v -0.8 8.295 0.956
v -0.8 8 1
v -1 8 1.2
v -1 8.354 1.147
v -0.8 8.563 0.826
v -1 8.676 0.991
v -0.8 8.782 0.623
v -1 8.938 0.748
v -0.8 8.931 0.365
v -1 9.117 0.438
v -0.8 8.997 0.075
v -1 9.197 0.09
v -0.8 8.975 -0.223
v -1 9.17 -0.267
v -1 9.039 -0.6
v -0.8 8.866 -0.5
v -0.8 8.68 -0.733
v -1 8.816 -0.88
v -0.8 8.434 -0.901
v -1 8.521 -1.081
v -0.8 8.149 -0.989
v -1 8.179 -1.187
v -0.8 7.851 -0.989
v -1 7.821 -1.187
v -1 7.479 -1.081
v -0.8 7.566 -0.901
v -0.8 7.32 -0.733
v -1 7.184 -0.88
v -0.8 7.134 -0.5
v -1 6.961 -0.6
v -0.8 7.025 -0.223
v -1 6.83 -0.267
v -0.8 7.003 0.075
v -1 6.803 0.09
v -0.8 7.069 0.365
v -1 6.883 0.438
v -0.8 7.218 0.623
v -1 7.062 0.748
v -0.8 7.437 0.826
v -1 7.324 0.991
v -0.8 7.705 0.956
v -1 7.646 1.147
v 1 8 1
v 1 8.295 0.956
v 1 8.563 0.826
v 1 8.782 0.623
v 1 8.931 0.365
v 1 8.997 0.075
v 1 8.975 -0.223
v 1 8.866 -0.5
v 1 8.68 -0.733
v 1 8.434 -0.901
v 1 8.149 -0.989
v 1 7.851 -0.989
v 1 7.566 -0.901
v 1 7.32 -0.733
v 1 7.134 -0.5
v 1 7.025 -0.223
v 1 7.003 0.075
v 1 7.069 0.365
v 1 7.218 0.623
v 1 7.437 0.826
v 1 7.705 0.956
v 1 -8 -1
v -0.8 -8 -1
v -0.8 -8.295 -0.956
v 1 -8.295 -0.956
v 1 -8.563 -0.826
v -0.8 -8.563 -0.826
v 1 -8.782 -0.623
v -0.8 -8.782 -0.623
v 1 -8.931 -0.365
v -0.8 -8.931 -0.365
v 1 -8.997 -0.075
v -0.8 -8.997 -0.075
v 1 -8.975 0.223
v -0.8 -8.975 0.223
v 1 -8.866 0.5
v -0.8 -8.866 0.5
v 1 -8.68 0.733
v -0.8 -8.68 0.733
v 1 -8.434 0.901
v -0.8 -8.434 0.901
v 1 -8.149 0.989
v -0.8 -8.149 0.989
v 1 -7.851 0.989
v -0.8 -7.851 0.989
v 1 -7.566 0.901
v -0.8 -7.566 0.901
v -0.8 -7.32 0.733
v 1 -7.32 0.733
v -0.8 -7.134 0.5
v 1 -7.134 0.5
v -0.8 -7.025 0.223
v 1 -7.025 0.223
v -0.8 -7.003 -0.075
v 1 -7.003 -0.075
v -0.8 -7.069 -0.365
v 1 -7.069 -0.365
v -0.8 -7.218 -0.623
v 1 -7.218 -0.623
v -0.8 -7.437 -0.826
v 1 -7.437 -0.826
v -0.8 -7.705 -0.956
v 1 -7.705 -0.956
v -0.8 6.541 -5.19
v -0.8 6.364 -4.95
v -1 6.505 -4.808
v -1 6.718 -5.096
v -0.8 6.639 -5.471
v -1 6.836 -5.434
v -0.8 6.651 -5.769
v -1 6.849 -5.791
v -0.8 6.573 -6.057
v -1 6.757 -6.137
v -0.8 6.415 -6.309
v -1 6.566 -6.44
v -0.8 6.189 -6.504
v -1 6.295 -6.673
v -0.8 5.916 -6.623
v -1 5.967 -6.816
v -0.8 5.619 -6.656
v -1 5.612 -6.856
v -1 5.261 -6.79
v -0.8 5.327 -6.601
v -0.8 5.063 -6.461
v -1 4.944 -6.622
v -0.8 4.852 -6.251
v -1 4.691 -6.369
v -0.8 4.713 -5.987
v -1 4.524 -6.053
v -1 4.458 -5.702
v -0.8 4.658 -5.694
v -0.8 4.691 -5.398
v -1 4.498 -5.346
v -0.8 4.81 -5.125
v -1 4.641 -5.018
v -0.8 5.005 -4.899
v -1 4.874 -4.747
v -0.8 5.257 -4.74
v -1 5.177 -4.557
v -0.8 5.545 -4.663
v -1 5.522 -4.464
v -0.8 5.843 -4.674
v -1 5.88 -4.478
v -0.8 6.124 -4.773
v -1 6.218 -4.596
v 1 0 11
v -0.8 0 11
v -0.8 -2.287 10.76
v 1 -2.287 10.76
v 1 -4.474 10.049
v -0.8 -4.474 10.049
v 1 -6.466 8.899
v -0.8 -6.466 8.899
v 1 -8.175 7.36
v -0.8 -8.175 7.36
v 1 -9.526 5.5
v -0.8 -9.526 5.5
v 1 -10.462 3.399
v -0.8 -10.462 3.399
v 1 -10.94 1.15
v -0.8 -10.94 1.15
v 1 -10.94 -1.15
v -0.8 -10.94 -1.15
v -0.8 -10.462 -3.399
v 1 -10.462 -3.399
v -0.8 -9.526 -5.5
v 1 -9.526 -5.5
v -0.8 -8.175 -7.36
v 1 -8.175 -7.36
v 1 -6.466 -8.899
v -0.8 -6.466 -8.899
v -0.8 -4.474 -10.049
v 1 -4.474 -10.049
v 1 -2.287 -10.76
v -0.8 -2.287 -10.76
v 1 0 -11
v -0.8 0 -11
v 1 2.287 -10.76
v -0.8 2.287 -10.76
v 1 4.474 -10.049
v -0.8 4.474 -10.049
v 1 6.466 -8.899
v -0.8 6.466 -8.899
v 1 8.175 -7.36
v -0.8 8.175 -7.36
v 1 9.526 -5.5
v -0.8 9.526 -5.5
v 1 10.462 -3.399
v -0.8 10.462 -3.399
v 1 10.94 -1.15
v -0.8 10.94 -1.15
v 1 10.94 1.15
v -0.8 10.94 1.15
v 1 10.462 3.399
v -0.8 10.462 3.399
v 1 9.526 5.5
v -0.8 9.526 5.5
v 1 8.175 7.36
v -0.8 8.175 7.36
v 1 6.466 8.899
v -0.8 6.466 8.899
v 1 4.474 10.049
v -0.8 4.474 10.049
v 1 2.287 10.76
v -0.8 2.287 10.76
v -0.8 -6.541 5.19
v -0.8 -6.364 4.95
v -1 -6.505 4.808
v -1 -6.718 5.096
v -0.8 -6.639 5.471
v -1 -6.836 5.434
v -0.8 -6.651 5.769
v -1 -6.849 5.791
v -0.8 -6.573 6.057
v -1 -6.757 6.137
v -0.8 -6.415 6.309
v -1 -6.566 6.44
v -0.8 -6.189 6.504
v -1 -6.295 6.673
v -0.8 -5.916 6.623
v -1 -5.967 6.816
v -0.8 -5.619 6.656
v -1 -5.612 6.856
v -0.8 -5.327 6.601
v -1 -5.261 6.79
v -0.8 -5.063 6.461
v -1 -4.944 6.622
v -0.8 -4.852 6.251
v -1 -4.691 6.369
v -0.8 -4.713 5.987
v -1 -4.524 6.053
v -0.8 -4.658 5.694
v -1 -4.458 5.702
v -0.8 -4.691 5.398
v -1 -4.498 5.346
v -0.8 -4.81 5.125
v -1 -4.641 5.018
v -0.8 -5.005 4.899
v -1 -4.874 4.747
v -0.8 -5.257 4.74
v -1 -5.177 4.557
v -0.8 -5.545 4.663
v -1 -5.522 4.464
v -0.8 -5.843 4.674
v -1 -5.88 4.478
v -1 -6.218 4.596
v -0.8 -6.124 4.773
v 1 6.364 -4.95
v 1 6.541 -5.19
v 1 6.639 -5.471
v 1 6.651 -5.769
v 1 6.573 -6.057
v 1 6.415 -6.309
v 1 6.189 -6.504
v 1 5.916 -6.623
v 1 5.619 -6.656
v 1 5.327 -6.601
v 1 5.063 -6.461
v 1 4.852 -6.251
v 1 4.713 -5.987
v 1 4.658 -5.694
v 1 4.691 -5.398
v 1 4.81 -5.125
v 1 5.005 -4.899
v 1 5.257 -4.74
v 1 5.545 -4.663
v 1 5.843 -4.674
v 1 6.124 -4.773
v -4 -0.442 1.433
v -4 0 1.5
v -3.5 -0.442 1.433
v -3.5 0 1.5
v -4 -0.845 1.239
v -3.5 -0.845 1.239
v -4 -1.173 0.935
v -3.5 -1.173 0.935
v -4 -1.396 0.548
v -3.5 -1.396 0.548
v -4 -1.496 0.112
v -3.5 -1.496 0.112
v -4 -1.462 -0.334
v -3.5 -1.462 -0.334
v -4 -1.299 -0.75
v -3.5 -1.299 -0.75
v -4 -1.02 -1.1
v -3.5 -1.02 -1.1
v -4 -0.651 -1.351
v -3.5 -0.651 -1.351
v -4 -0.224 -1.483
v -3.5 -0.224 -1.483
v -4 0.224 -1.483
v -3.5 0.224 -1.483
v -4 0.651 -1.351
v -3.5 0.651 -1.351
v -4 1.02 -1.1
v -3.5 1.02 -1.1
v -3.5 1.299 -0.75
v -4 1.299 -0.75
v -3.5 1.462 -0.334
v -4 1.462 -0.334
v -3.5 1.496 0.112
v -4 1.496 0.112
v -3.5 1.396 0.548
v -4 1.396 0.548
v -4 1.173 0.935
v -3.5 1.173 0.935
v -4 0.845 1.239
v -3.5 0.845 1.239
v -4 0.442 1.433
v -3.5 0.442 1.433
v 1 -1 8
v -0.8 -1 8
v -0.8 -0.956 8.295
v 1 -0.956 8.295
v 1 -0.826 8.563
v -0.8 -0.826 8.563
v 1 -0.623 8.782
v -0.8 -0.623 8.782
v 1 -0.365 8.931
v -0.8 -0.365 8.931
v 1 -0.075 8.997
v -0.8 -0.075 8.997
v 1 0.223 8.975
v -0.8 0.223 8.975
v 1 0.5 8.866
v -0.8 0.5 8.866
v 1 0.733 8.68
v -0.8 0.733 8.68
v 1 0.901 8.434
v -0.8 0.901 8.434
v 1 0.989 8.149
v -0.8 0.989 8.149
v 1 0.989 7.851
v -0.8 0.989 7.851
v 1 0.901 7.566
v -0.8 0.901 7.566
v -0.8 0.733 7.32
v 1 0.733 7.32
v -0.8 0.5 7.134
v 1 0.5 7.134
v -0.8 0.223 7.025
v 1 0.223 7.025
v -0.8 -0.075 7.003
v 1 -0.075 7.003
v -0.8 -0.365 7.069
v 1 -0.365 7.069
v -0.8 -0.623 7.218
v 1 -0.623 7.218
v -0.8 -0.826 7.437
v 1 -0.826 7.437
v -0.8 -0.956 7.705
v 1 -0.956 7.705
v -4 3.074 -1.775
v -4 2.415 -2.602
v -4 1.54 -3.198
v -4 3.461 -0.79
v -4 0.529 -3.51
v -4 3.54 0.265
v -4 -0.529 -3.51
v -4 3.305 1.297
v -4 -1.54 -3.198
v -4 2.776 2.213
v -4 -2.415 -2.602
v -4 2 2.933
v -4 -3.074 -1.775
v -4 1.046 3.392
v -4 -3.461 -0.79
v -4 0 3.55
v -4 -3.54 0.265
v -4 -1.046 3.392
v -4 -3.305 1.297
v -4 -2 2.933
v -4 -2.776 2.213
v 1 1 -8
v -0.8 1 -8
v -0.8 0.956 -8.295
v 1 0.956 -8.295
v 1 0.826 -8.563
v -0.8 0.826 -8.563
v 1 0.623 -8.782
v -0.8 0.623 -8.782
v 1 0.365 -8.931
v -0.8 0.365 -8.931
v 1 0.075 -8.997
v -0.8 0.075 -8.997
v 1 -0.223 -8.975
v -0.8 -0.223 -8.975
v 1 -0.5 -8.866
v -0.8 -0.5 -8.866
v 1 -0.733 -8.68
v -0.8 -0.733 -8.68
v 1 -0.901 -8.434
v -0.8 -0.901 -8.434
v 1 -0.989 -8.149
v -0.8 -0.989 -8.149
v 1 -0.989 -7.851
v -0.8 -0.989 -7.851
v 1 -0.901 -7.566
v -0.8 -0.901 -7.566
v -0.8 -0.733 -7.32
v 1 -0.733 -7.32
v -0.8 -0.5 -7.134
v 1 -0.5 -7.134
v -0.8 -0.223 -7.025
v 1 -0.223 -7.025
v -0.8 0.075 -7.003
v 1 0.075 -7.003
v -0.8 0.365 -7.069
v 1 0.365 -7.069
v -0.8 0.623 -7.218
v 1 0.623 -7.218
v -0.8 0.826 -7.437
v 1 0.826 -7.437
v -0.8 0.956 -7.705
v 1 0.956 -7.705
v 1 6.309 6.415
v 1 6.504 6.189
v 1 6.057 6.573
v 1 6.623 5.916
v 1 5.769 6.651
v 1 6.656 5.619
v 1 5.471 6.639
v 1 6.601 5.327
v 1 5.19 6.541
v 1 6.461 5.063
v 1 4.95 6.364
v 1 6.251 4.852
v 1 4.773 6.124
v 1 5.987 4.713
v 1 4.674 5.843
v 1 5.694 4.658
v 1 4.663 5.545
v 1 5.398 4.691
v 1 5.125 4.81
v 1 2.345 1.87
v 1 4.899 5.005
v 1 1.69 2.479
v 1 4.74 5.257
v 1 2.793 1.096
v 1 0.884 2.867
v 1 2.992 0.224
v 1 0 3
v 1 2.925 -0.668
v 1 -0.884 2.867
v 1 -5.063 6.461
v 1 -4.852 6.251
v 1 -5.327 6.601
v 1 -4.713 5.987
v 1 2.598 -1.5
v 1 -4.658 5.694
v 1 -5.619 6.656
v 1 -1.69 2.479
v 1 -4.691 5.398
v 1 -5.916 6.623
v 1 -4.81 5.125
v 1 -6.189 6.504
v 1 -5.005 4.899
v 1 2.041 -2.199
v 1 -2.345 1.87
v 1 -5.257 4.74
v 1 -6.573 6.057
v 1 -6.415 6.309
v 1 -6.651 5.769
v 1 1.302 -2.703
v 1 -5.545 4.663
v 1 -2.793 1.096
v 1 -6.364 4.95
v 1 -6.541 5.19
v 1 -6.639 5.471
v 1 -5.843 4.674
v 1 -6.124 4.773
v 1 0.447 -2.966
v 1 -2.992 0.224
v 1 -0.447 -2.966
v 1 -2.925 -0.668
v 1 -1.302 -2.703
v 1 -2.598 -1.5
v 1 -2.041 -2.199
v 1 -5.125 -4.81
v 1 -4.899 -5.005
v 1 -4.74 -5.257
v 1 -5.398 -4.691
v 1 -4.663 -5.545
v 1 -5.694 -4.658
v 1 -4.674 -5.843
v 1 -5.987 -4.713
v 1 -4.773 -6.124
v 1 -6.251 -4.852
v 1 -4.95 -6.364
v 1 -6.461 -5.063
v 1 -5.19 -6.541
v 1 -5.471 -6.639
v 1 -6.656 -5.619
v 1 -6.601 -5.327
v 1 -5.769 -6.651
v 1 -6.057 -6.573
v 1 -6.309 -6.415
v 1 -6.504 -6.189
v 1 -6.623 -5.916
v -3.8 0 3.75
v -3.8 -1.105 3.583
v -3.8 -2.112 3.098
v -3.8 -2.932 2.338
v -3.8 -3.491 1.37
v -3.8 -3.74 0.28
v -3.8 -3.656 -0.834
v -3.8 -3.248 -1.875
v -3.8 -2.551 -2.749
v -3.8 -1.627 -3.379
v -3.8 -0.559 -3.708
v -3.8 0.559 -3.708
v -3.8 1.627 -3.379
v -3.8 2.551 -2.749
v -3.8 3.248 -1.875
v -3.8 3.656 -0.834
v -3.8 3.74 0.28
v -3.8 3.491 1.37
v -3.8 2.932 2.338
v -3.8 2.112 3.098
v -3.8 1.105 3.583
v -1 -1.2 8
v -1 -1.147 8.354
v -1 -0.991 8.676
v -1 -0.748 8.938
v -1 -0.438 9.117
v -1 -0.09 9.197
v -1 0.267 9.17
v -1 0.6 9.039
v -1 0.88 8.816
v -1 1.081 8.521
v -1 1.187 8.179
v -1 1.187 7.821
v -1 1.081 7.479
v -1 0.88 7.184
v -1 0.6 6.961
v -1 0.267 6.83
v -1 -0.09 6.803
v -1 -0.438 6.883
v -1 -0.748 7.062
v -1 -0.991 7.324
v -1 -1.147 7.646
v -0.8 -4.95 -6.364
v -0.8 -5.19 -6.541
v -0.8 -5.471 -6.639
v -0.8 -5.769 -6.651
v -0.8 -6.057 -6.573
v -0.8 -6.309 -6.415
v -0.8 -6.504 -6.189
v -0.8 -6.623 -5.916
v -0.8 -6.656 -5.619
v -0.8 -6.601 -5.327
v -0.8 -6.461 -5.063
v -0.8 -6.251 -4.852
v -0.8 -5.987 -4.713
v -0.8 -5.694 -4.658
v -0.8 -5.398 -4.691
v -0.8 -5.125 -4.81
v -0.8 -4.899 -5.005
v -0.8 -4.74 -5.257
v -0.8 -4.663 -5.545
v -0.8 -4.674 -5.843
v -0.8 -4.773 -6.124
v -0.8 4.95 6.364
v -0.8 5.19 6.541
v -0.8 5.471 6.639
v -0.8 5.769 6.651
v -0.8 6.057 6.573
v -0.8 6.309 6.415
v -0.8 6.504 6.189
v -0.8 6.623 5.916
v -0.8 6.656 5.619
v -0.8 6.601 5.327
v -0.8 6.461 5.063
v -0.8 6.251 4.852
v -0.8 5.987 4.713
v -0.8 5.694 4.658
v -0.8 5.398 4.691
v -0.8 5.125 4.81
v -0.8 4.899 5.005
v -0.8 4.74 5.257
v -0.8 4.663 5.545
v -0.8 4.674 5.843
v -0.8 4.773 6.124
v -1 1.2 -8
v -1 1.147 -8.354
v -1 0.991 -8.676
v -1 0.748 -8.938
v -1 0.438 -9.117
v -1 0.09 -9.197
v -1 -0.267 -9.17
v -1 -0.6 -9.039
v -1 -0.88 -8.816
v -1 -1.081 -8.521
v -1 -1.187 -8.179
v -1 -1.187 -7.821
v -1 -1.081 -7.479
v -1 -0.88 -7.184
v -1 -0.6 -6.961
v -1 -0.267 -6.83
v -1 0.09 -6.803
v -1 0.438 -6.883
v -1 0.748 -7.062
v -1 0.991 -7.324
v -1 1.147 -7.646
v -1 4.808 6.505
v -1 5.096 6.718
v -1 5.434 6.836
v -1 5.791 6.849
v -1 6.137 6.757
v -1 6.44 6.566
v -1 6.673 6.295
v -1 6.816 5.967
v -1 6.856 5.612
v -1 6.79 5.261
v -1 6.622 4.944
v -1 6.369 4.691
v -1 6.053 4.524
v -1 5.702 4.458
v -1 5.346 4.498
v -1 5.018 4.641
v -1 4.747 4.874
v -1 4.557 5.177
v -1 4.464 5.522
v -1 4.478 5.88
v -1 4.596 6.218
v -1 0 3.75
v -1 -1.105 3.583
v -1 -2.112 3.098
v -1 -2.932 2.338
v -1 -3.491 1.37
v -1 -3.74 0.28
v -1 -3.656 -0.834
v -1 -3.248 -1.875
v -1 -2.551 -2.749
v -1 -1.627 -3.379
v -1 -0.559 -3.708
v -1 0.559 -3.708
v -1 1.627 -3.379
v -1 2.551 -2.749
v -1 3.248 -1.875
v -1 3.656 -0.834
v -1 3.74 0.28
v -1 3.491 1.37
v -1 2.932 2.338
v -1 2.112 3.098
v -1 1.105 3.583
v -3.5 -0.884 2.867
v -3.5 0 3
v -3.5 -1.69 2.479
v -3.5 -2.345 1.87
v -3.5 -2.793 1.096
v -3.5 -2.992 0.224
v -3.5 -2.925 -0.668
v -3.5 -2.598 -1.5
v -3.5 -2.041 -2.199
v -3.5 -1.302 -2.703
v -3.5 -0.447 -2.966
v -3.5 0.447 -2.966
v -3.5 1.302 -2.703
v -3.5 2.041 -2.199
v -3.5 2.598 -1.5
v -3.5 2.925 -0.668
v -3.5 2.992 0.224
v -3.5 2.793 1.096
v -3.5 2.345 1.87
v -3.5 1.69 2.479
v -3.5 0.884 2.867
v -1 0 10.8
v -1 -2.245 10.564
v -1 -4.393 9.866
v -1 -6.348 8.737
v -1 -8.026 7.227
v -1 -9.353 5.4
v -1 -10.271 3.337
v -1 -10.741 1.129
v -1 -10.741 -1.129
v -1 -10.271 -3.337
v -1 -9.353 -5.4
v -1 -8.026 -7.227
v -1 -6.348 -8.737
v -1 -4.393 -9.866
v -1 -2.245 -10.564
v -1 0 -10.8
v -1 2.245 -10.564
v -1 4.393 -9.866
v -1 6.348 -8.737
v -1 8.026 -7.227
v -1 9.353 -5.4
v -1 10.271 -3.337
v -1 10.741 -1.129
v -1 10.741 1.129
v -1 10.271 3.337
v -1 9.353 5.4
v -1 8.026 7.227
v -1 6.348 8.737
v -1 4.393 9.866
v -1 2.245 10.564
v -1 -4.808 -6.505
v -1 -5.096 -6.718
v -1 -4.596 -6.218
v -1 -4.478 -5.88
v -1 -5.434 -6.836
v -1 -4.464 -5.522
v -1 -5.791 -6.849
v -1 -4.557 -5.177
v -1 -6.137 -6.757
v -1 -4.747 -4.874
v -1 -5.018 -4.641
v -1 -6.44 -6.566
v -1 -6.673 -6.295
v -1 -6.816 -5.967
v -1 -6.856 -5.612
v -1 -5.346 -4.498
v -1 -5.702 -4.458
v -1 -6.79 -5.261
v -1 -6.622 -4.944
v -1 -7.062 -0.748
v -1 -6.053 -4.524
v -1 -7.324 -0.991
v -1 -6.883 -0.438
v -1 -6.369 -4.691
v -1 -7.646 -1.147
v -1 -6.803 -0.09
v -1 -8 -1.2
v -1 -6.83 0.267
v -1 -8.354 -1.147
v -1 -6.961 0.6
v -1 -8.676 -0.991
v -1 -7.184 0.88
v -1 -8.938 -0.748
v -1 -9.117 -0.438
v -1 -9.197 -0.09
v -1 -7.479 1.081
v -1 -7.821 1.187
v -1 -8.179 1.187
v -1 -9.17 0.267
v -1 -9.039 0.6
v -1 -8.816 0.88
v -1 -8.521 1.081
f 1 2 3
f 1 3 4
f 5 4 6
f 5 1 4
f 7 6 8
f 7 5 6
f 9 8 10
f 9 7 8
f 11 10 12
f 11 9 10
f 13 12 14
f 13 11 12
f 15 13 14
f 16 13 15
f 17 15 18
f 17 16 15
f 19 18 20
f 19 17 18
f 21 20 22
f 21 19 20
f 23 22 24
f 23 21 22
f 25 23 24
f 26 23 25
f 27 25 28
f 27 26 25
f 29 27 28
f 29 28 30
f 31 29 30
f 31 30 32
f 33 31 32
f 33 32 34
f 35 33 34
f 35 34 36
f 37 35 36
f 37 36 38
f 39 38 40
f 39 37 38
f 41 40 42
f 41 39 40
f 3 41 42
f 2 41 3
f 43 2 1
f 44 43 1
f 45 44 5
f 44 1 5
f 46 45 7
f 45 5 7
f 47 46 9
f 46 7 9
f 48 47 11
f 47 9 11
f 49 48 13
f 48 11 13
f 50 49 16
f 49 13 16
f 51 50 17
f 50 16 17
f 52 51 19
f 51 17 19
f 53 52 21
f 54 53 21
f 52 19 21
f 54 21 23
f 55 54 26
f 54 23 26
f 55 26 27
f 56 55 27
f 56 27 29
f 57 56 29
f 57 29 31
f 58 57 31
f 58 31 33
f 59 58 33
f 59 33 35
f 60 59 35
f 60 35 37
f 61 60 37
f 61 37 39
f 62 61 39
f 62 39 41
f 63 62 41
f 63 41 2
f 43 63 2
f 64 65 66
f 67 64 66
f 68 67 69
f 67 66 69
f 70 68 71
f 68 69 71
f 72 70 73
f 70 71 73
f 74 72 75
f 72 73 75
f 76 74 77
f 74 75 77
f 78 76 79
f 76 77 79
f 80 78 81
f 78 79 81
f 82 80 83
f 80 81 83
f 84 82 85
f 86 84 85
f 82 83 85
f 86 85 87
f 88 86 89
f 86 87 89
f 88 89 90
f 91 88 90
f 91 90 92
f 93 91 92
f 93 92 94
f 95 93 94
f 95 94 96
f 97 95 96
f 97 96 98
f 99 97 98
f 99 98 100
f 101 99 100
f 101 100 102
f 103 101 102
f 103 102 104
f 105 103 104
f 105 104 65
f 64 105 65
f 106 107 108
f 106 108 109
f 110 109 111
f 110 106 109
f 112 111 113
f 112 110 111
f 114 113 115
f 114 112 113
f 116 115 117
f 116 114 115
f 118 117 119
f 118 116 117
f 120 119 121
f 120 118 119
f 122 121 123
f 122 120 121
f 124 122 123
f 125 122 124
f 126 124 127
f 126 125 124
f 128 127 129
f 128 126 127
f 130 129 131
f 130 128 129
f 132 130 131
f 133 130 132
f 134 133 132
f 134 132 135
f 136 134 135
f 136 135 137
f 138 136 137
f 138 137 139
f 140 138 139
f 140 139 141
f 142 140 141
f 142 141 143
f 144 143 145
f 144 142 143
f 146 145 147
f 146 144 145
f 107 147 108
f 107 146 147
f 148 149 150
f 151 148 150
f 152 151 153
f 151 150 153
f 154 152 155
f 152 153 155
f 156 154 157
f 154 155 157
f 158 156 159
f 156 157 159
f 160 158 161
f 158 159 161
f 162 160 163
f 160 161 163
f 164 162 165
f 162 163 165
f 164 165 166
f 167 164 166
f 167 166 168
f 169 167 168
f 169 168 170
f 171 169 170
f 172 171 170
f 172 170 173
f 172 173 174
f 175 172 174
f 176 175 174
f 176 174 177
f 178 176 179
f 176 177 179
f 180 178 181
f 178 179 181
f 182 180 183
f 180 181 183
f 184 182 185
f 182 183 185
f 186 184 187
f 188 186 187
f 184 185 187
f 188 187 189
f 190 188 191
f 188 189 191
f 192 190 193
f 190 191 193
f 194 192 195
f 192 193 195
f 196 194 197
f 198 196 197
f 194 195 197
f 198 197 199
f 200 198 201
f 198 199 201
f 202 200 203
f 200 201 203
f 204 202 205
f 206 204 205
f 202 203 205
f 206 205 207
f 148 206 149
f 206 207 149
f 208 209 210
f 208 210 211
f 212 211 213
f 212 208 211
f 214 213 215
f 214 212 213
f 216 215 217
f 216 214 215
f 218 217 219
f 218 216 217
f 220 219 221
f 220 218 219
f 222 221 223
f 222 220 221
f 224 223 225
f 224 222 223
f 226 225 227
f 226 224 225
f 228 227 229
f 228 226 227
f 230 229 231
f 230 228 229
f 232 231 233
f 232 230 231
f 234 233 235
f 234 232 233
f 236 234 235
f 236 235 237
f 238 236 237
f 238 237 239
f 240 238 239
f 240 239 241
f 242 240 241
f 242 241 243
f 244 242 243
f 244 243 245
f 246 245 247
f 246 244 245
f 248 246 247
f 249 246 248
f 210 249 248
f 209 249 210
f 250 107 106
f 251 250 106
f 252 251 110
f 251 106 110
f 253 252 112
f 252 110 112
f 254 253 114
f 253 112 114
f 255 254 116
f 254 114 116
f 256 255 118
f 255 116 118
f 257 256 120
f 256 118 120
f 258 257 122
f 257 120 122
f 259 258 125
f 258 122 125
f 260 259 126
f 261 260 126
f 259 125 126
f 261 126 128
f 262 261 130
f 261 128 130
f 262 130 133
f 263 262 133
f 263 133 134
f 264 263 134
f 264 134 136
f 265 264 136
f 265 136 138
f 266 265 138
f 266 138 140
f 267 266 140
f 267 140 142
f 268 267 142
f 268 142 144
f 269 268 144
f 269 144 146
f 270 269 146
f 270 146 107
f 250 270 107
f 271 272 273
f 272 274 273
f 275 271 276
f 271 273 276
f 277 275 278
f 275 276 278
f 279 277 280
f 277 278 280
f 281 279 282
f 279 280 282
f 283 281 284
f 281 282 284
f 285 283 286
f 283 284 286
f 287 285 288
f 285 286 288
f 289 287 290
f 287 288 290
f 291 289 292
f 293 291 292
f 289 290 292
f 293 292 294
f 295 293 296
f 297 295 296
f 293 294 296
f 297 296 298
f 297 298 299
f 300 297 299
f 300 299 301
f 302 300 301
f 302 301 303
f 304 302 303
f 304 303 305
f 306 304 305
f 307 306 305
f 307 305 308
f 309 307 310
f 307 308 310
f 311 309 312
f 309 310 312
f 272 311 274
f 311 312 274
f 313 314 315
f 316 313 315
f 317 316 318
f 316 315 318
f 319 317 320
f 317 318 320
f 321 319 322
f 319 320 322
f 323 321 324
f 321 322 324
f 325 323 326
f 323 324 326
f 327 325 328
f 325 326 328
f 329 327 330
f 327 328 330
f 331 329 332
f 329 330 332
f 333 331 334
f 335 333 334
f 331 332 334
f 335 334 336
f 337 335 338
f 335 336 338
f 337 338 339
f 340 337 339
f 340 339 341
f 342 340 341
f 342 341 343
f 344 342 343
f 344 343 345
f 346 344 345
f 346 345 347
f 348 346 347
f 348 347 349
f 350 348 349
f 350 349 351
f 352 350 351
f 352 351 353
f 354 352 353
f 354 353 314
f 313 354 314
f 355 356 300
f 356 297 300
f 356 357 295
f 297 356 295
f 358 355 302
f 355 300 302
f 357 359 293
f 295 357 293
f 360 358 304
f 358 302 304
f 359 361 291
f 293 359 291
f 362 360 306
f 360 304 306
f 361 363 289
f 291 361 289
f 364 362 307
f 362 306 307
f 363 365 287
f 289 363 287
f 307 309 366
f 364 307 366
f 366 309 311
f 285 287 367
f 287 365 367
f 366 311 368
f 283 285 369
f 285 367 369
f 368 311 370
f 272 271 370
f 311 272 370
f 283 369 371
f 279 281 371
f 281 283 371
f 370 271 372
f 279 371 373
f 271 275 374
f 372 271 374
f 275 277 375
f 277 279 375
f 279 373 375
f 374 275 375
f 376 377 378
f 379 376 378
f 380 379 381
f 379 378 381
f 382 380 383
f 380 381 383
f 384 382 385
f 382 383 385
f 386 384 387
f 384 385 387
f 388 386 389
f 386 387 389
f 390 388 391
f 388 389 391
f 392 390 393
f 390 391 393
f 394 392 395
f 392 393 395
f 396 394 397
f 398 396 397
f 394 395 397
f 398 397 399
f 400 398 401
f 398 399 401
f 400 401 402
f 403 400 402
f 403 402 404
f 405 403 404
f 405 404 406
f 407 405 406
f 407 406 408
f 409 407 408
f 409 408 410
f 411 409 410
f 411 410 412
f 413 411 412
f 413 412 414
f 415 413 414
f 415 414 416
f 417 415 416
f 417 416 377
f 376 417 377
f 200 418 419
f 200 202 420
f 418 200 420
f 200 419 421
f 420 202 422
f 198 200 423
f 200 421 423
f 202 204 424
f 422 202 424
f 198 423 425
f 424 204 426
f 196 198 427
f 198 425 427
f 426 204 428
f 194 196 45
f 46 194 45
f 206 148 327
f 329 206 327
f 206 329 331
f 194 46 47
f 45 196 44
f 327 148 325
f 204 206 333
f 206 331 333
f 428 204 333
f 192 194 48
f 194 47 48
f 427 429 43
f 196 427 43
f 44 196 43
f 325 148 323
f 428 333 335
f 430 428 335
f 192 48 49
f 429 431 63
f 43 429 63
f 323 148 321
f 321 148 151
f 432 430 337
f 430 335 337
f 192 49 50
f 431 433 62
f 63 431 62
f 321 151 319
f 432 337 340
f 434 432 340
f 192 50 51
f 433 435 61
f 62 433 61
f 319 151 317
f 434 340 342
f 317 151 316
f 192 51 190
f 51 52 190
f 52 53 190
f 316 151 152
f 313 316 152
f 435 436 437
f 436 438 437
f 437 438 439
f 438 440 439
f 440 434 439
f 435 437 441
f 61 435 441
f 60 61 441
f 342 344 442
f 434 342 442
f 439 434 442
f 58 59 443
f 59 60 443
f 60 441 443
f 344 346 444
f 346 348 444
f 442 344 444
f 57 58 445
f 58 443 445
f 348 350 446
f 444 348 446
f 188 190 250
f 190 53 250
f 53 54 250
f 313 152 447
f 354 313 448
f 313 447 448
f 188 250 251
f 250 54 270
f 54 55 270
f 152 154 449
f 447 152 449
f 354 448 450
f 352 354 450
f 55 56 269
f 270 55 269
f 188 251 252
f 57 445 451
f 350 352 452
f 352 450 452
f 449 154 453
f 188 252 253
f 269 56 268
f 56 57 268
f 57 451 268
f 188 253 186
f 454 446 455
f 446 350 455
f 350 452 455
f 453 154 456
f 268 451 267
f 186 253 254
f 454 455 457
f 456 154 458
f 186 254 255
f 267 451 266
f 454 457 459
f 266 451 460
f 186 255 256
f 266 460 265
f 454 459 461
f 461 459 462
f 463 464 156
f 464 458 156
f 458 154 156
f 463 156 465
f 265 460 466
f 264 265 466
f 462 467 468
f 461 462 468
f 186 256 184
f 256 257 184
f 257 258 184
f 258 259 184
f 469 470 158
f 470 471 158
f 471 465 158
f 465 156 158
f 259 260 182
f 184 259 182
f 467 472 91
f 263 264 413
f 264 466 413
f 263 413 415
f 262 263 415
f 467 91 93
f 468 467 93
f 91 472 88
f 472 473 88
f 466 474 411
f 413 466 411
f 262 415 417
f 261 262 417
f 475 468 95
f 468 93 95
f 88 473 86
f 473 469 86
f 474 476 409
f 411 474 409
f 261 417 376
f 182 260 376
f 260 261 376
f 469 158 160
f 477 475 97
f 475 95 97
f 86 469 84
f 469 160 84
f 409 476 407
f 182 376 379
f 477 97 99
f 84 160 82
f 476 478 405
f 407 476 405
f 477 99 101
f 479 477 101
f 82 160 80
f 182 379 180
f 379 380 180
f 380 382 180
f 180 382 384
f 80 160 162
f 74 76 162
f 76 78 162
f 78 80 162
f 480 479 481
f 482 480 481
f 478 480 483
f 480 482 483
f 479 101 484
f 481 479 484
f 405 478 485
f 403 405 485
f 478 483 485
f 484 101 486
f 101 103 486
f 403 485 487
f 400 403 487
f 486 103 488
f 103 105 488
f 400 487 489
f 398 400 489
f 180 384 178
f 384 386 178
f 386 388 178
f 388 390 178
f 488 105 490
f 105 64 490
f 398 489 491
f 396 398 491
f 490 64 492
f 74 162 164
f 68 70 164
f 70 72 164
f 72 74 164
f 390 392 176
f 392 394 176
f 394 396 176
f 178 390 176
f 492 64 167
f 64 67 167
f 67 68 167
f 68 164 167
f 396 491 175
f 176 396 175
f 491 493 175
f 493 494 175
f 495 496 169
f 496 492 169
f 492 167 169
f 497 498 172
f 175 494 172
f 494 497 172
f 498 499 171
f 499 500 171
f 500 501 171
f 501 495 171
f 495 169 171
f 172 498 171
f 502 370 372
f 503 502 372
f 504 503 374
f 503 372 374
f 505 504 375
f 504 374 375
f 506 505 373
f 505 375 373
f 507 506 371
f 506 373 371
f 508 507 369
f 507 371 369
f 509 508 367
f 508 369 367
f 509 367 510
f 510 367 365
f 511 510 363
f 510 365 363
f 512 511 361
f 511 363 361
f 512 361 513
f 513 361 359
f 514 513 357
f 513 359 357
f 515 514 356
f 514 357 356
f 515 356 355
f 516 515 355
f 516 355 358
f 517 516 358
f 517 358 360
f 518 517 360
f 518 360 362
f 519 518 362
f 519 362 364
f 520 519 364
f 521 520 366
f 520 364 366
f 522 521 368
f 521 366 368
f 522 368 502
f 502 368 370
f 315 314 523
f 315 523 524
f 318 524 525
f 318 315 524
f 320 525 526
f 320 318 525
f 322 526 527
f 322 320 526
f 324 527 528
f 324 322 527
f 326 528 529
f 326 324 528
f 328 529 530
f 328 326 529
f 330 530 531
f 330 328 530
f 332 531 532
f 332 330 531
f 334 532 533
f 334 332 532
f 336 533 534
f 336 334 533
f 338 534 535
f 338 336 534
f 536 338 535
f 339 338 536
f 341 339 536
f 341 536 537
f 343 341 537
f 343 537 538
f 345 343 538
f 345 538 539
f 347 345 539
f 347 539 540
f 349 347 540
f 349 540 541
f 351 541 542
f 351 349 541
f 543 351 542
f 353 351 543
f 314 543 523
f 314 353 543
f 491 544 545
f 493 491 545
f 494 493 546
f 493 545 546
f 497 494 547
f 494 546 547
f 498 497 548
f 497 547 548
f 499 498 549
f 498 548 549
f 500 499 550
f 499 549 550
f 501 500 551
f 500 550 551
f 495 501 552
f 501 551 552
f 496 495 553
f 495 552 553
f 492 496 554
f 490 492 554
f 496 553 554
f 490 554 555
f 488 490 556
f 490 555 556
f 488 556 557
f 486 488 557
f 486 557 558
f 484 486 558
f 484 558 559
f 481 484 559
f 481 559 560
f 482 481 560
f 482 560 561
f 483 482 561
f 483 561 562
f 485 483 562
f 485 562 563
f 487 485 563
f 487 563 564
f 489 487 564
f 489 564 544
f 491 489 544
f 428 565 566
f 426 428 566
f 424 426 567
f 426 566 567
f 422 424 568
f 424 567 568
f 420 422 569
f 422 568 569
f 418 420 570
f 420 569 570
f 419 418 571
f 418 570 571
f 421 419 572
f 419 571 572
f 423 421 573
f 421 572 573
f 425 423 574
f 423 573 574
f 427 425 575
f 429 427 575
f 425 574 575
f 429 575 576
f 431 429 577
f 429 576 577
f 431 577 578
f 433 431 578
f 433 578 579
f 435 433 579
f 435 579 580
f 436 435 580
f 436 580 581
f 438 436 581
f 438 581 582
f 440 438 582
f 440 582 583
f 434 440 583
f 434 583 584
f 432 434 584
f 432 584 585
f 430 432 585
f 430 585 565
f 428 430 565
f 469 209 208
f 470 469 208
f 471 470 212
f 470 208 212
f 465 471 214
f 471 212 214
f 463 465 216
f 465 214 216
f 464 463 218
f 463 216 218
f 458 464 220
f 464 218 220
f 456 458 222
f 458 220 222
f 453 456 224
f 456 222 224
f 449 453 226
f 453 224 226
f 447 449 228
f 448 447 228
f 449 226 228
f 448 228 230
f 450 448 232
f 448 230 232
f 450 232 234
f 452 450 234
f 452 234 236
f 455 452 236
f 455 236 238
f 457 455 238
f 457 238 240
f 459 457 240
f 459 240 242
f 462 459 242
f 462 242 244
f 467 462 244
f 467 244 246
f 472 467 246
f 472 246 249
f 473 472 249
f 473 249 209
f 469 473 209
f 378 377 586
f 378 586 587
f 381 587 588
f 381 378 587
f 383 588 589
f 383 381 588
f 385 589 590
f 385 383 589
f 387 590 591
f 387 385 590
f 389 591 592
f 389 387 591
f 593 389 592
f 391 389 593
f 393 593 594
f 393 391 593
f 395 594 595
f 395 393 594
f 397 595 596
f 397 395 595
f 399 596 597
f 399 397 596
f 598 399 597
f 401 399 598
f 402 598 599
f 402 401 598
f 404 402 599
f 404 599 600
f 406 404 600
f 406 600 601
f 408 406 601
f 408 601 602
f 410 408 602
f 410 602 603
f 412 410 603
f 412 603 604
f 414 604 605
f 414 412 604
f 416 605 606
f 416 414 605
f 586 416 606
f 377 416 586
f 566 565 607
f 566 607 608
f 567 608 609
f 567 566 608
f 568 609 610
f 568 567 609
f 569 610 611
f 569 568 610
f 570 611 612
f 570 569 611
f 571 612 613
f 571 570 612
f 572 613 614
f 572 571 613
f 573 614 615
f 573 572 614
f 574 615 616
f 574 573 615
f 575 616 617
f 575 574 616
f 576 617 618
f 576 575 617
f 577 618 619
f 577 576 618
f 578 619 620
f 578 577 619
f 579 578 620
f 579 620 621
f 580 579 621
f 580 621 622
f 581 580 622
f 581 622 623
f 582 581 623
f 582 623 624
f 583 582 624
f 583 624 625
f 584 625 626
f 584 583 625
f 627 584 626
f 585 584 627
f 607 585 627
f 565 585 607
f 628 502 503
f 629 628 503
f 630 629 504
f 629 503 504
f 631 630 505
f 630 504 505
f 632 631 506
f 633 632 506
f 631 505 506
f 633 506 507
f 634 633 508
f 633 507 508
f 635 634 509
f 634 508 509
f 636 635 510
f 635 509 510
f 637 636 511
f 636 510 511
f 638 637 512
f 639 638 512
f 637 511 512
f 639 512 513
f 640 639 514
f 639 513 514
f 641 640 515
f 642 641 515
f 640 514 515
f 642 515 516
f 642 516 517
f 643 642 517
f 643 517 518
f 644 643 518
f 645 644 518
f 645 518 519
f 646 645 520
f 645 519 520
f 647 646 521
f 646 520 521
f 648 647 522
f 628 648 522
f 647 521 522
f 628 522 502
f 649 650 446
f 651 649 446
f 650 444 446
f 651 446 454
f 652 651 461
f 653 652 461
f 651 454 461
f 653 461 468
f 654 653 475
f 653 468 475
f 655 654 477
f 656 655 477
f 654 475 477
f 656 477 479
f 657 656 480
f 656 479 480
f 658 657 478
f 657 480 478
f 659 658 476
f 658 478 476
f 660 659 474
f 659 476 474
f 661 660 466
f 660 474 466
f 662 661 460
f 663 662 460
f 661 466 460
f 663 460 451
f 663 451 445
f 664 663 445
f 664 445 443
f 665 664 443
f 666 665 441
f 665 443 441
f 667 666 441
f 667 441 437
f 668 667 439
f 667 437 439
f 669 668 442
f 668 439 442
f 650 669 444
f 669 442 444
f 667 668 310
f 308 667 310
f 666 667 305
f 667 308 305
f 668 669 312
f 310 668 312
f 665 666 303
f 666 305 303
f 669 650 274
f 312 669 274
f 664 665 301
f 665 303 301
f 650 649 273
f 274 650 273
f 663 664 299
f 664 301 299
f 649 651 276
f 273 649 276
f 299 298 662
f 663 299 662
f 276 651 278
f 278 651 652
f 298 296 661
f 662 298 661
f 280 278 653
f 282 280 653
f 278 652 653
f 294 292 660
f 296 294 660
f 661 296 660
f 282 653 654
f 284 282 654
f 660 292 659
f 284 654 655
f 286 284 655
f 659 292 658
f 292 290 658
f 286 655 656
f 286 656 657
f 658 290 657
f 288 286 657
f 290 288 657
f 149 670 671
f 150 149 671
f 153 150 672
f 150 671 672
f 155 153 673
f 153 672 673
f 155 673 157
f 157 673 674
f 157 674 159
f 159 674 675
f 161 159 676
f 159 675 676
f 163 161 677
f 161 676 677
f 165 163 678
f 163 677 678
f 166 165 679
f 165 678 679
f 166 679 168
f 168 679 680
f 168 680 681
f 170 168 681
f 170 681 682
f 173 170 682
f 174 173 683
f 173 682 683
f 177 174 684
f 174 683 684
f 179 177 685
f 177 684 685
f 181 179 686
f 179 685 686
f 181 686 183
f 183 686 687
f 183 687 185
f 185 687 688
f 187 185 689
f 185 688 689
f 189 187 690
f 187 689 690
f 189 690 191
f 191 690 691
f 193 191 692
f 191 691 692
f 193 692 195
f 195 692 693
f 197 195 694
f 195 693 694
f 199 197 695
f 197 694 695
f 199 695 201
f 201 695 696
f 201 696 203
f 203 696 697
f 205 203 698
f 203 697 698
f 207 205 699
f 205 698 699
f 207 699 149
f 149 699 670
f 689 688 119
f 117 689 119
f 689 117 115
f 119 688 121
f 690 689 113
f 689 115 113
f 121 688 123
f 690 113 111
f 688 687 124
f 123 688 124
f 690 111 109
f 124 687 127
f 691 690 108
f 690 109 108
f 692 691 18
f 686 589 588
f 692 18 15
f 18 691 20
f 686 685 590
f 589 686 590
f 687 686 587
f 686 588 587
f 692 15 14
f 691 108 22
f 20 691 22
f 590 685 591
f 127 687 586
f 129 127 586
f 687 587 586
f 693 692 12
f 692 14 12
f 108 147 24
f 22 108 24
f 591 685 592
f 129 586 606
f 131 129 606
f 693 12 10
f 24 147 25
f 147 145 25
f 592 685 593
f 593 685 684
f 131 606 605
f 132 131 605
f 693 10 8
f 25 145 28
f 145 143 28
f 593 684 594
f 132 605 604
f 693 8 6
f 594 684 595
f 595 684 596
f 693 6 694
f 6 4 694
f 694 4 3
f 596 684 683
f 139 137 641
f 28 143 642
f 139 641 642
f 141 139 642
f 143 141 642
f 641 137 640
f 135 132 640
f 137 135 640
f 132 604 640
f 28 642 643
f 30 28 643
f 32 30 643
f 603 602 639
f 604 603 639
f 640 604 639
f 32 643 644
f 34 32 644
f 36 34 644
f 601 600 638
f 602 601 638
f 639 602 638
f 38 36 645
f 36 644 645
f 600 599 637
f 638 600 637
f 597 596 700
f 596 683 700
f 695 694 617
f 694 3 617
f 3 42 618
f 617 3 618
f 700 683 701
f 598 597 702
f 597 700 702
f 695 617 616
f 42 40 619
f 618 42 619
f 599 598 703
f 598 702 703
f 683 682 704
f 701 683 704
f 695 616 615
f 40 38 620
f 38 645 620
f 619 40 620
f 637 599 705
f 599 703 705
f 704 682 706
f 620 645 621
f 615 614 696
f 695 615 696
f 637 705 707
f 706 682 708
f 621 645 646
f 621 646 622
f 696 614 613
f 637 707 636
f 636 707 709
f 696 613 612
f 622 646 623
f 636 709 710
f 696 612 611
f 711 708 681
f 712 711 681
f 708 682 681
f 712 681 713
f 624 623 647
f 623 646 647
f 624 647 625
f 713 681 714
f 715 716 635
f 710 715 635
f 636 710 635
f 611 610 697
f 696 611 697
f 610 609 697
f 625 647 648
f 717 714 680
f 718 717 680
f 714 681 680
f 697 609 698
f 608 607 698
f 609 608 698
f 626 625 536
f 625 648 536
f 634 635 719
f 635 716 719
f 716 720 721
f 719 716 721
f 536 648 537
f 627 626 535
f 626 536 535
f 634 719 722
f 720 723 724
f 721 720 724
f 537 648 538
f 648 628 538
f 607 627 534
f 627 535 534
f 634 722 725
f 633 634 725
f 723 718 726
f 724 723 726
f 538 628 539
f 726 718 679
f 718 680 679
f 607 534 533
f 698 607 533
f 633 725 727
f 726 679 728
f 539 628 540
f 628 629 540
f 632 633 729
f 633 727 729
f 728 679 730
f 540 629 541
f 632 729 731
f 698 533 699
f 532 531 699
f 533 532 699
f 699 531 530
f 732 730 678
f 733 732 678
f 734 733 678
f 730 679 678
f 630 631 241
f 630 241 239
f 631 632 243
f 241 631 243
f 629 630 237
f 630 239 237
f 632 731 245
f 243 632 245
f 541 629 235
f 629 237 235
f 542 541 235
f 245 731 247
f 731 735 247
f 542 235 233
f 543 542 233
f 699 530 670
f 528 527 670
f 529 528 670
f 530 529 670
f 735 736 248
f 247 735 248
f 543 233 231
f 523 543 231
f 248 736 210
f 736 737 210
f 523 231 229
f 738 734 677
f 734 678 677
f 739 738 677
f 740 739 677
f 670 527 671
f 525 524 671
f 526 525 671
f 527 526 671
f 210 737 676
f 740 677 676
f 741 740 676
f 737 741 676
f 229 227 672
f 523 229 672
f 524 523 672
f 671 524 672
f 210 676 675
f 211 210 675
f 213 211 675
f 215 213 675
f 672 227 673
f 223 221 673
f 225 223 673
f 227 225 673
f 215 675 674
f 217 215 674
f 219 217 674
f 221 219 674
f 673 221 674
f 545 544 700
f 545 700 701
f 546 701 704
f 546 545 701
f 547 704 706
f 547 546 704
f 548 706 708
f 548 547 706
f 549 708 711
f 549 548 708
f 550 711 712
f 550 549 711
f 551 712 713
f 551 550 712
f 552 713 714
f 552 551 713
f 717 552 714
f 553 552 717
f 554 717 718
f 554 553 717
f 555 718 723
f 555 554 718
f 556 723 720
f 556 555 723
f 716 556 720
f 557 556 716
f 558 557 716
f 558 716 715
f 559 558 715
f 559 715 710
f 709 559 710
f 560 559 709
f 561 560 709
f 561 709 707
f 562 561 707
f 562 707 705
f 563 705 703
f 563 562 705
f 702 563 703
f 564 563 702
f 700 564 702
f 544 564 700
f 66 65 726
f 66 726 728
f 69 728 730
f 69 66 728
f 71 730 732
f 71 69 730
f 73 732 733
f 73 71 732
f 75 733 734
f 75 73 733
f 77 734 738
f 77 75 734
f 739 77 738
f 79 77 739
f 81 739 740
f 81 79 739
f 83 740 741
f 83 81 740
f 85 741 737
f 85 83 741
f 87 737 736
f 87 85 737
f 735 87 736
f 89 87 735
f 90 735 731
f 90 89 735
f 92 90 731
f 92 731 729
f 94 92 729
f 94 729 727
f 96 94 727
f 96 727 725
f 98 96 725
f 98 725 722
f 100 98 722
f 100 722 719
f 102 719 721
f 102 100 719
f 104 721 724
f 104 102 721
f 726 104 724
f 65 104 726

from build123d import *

# Parameters (mm, degrees)
SKETCH2_R          = 1
CUT_EXTRUDE1_DEPTH = 16.842979518
CIRPATTERN1_COUNT  = 8
CHAMFER1_SIZE      = 0.2


with BuildPart() as part:
    # Sketch1 → Revolve1 (revolve)
    with BuildSketch(Plane.XY, mode=Mode.PRIVATE) as revolve1_sk:
        Polygon((1, 11), (-1, 11), (-1, 3.75), (-4, 3.75), (-4, 1.5), (-3.5, 1.5), (-3.5, 3), (1, 3), align=None)
    revolve(revolve1_sk.sketch.rotate(Axis((0, 0, 0), (1, 0, 0)), 90), axis=Axis((0, 0, 0), (1, 0, 0)))

    # Sketch2 → Cut-Extrude1 (cut, through all)
    with BuildSketch(Plane.ZY.offset(1)):
        with Locations((0, 8)):
            Circle(SKETCH2_R)
    cut_extrude1 = extrude(amount=-CUT_EXTRUDE1_DEPTH, mode=Mode.SUBTRACT)

    # CirPattern1: Cut-Extrude1 ×8 about axis
    cirpattern1_axis = Axis((0, 0, 0), (1, 0, 0))
    for i in range(1, CIRPATTERN1_COUNT):
        add(cut_extrude1.rotate(cirpattern1_axis, i * 360 / CIRPATTERN1_COUNT), mode=Mode.SUBTRACT)

    # Chamfer1
    chamfer1_edges = [part.edges().sort_by_distance(p)[0] for p in [
        (-1, 8, -1),
        (-1, 4.949747468, -6.363961031),
        (-1, -1, -8),
        (-1, -6.363961031, -4.949747468),
        (-1, -8, 1),
        (-1, -4.949747468, 6.363961031),
        (-1, 1, 8),
        (-1, 6.363961031, 4.949747468),
        (-4, 0, -3.75),
        (-1, 0, -11),
    ]]
    chamfer(chamfer1_edges, length=CHAMFER1_SIZE)


solid = part.part
